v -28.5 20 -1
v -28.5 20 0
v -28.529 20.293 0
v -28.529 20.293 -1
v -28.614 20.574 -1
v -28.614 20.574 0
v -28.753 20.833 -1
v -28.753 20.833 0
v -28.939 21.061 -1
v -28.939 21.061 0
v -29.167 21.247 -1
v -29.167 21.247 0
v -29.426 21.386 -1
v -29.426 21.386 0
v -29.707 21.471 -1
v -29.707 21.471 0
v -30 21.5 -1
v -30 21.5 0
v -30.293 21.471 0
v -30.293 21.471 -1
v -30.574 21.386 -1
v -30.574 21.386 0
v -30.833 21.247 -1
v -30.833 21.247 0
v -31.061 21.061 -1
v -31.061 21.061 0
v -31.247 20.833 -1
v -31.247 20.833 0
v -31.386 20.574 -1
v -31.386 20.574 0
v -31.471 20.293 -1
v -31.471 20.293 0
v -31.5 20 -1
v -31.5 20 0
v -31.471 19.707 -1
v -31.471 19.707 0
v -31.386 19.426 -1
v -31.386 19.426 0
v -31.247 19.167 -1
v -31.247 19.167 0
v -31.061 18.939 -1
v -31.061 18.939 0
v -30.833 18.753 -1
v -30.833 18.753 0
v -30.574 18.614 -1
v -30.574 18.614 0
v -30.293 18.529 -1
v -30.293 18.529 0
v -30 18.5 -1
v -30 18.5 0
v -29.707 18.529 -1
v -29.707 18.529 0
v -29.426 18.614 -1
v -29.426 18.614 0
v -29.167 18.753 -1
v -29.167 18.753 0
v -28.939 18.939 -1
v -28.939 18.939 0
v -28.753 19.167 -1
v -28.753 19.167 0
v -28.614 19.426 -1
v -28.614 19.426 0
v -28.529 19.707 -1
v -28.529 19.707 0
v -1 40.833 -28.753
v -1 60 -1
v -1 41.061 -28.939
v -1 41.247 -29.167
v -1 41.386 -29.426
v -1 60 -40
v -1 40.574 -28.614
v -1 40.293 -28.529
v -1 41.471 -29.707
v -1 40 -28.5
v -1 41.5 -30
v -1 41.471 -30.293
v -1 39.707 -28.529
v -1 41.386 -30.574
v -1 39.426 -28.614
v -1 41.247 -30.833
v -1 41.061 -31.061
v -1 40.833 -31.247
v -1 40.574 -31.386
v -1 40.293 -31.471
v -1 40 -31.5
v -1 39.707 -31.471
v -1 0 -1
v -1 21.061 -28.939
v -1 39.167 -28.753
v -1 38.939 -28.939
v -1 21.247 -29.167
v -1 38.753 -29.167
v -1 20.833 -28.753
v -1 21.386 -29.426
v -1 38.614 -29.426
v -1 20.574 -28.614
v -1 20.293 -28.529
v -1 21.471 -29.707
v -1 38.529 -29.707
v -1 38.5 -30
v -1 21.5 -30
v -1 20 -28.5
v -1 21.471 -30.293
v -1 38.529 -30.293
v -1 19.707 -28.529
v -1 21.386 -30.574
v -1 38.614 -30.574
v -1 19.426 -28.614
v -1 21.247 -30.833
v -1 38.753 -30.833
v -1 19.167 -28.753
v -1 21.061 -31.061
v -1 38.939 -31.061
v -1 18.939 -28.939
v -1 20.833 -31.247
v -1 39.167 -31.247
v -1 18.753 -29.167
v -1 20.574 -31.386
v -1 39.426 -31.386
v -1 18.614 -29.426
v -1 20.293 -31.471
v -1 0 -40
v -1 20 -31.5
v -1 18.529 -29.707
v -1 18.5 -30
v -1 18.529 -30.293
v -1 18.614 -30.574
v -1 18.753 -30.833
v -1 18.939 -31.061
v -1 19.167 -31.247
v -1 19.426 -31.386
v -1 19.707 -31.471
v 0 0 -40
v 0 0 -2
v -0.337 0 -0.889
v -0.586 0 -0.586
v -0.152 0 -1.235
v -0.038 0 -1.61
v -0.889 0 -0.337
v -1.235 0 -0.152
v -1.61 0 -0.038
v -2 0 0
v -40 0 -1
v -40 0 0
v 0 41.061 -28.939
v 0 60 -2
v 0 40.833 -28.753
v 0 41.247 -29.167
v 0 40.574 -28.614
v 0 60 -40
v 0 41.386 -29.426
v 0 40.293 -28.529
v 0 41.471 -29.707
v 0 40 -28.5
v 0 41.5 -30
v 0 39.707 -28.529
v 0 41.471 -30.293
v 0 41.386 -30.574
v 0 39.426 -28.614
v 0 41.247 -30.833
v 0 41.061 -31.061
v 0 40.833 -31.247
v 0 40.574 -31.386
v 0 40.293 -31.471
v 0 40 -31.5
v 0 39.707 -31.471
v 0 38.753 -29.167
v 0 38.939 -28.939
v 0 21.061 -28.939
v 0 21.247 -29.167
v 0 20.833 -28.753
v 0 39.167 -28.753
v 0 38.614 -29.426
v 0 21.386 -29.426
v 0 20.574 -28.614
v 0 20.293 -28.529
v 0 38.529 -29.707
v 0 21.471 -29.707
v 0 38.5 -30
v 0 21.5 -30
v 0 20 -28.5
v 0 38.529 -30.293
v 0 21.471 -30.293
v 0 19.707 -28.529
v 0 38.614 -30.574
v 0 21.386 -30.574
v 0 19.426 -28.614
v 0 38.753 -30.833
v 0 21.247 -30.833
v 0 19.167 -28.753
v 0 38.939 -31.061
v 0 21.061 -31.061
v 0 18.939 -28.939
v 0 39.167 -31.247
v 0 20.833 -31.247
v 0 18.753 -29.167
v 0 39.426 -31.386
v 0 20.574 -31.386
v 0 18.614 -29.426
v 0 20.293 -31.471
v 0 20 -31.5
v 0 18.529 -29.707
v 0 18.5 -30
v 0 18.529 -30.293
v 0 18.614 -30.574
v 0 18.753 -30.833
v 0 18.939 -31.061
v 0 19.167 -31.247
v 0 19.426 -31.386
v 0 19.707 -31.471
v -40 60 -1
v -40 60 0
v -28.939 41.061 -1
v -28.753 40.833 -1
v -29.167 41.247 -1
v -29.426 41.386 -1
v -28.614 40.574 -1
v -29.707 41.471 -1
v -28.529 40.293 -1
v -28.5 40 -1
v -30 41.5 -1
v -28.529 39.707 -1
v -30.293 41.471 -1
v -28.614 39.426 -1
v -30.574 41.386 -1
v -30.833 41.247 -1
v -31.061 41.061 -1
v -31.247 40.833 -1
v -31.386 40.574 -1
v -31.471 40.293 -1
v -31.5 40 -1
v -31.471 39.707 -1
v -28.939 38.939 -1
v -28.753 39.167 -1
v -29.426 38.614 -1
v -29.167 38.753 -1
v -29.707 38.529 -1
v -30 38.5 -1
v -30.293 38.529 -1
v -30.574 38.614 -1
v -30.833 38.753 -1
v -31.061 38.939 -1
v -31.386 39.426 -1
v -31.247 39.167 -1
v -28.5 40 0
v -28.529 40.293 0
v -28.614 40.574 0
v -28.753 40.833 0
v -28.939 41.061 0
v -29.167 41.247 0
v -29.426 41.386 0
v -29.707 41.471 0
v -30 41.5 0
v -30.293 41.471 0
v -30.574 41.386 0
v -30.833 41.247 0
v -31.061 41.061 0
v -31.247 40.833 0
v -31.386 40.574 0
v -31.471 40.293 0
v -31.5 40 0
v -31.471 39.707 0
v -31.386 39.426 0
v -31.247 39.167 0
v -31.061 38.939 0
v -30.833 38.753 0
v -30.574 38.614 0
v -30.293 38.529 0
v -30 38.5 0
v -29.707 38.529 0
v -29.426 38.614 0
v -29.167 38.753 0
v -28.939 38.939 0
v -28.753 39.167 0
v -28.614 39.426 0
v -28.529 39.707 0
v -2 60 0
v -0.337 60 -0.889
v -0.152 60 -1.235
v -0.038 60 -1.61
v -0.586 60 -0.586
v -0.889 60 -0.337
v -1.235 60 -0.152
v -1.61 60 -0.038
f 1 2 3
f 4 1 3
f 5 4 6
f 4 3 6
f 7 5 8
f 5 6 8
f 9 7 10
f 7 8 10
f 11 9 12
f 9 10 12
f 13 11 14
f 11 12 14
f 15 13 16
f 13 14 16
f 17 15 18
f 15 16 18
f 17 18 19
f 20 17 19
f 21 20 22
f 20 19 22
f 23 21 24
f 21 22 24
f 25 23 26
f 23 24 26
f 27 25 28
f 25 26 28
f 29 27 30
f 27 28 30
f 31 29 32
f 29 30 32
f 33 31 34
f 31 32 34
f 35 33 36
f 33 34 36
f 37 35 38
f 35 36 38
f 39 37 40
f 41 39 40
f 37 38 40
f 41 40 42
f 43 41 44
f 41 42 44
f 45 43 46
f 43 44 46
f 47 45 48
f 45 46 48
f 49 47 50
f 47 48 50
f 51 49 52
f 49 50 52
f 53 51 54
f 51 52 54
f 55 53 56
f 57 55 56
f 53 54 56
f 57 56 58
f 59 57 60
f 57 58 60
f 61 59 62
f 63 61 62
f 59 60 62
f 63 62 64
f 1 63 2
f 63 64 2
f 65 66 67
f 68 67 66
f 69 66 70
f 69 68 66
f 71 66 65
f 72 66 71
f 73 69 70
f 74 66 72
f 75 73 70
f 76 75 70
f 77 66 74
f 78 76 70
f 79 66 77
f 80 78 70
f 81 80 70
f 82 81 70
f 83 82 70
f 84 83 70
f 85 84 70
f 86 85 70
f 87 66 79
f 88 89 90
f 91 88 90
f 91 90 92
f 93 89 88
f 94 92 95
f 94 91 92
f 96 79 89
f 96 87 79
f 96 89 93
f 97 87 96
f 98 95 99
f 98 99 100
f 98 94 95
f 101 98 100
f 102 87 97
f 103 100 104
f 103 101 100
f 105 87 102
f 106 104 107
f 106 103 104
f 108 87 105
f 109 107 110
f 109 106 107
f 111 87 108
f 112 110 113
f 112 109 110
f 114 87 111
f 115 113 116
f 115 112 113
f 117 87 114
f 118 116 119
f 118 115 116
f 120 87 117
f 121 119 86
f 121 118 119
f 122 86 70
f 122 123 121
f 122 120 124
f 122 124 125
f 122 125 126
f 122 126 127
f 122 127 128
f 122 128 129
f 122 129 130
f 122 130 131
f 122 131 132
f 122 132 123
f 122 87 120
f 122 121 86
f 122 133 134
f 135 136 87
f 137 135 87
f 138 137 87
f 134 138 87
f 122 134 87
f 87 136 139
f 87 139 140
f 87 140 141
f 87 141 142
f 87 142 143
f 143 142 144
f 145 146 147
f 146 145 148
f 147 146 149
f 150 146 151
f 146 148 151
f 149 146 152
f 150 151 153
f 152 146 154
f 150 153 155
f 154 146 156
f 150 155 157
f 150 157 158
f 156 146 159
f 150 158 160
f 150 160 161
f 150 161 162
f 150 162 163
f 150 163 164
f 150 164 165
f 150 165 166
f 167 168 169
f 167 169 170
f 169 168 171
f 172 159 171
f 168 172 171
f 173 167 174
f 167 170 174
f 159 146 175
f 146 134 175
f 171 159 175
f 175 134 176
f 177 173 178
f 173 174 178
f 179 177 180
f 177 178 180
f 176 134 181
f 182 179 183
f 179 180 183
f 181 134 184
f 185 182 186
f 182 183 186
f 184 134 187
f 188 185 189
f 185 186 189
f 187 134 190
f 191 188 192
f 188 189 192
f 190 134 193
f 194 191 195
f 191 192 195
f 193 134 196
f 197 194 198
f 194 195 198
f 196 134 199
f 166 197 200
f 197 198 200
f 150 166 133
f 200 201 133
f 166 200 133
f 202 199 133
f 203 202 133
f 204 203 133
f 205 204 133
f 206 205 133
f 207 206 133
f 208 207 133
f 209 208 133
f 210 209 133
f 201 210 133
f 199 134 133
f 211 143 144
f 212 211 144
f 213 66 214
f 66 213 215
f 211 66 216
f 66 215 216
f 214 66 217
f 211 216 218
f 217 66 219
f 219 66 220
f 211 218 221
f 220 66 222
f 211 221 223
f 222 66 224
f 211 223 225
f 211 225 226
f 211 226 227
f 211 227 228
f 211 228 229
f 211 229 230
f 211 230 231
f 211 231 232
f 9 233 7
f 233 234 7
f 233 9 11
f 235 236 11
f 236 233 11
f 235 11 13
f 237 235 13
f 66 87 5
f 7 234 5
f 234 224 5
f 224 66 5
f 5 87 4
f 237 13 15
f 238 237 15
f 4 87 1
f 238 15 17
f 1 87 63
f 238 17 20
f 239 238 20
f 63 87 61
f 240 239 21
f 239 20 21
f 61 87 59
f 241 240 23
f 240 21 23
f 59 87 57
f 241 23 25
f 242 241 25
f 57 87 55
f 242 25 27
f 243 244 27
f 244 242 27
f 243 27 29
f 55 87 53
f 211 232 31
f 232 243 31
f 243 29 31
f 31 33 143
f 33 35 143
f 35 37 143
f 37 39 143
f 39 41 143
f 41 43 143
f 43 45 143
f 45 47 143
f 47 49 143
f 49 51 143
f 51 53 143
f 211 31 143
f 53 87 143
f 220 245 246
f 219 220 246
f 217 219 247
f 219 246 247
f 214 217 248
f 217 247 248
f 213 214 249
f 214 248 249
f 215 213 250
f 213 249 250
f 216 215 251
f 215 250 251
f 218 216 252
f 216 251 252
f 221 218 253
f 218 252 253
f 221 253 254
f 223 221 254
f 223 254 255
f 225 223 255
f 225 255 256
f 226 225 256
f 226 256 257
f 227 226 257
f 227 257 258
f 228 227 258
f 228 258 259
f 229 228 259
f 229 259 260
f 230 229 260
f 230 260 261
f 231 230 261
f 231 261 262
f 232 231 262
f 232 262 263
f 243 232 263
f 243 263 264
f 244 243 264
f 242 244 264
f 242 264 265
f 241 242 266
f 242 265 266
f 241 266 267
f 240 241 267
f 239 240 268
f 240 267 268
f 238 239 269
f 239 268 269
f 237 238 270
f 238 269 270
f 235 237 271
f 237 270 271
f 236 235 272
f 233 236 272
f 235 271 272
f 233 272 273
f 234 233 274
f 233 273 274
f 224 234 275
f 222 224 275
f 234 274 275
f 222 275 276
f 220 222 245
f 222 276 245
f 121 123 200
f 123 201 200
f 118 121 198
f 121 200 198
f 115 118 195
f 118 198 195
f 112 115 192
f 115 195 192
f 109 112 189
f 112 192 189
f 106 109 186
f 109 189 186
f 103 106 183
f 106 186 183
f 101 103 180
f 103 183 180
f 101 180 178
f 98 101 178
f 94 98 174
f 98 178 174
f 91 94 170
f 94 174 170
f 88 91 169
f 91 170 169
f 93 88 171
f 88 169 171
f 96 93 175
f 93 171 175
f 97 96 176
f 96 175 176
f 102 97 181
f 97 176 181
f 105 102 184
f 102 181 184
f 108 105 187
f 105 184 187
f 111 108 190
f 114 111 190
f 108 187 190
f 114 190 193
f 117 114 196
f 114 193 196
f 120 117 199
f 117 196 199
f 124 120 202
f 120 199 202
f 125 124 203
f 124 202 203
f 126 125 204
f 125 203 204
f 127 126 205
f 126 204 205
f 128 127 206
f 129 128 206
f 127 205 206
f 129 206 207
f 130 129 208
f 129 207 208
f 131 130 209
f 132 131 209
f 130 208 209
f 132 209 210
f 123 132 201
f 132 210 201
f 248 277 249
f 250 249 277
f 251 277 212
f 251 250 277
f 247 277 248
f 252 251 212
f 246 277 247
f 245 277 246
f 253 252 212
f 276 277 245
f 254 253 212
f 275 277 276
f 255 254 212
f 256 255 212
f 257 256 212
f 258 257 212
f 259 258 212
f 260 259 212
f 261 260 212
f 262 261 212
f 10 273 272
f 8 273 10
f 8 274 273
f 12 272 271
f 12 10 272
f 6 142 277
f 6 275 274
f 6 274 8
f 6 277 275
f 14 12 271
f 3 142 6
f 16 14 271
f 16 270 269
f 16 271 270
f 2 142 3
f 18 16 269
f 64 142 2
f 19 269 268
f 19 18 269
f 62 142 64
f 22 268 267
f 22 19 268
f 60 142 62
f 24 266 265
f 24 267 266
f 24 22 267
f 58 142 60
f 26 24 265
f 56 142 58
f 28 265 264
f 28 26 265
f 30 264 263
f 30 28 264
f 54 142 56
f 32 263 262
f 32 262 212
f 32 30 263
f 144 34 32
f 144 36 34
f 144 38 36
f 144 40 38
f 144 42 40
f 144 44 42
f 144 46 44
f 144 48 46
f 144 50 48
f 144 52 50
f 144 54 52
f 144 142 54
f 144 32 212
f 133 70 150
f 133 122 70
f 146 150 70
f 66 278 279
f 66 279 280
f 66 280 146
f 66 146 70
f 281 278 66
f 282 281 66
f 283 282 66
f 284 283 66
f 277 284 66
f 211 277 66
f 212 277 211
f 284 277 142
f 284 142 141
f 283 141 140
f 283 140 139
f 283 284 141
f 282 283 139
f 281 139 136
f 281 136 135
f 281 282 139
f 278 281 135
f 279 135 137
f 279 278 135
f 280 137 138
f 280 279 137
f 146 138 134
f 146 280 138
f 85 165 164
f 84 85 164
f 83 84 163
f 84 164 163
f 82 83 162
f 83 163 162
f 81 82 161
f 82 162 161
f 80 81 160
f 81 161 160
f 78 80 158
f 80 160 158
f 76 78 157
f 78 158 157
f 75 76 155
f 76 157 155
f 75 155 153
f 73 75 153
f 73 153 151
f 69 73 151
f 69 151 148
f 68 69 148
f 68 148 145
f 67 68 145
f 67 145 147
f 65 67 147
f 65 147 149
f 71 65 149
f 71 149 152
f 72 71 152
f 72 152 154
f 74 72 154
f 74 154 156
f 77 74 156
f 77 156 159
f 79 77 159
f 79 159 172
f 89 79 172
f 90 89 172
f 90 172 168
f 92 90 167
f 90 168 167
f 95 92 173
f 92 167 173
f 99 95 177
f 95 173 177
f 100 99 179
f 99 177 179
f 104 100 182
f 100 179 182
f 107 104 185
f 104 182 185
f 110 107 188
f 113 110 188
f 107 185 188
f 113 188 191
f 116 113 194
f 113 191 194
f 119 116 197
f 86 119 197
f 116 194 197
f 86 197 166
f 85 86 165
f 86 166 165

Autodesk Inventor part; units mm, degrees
ref_plane "YZ Plane" through (0, 0, 0) normal (1, 0, 0) x (0, 1, 0)
ref_plane "XZ Plane" through (0, 0, 0) normal (0, 1, 0) x (-1, 0, 0)
ref_plane "XY Plane" through (0, 0, 0) normal (0, 0, 1) x (1, 0, 0)
sketch "Sketch1" plane through (0, 0, 0) normal (0, 1, 0) x (-1, 0, 0)
  line L0 (60, 0) -> (60, -1)
  line L1 (1, -60) -> (0, -60)
  line L2 (0, 0) -> (0, -40)
  line L3 (1, -1) -> (1, -40)
  line L4 (1, -40) -> (0, -40)
  line L5 (0, 0) -> (40, 0)
  line L6 (1, -1) -> (40, -1)
  line L7 (40, -1) -> (40, 0)
  dimension "d0" = 60
  dimension "d2" = 1
  dimension "d15" = 40
  dimension "d24" = 40
extrude "Extrusion1" add sketch "Sketch1" along normal blind 60
fillet "Fillet1" radius 2 1 edges at (0, 30, 0)
sketch "Sketch4" plane through (0, 0, -40) normal (1, 0, 0) x (0, 0, -1)
  circle A0 centre (-10, 40) radius 1.5
  circle A1 centre (-10, 20) radius 1.5
  point P0 (-40, 0)
  dimension "d17" = 3
  dimension "d18" = 3
extrude "Extrusion4" cut sketch "Sketch4" against normal blind 1
sketch "Sketch5" plane through (-40, 0, 0) normal (0, 0, 1) x (1, 0, 0)
  circle A0 centre (10, 40) radius 1.5
  circle A1 centre (10, 20) radius 1.5
  point P0 (40, 0)
  dimension "d25" = 3
  dimension "d27" = 3
extrude "Extrusion5" cut sketch "Sketch5" against normal blind 1
properties part number "clamp"
